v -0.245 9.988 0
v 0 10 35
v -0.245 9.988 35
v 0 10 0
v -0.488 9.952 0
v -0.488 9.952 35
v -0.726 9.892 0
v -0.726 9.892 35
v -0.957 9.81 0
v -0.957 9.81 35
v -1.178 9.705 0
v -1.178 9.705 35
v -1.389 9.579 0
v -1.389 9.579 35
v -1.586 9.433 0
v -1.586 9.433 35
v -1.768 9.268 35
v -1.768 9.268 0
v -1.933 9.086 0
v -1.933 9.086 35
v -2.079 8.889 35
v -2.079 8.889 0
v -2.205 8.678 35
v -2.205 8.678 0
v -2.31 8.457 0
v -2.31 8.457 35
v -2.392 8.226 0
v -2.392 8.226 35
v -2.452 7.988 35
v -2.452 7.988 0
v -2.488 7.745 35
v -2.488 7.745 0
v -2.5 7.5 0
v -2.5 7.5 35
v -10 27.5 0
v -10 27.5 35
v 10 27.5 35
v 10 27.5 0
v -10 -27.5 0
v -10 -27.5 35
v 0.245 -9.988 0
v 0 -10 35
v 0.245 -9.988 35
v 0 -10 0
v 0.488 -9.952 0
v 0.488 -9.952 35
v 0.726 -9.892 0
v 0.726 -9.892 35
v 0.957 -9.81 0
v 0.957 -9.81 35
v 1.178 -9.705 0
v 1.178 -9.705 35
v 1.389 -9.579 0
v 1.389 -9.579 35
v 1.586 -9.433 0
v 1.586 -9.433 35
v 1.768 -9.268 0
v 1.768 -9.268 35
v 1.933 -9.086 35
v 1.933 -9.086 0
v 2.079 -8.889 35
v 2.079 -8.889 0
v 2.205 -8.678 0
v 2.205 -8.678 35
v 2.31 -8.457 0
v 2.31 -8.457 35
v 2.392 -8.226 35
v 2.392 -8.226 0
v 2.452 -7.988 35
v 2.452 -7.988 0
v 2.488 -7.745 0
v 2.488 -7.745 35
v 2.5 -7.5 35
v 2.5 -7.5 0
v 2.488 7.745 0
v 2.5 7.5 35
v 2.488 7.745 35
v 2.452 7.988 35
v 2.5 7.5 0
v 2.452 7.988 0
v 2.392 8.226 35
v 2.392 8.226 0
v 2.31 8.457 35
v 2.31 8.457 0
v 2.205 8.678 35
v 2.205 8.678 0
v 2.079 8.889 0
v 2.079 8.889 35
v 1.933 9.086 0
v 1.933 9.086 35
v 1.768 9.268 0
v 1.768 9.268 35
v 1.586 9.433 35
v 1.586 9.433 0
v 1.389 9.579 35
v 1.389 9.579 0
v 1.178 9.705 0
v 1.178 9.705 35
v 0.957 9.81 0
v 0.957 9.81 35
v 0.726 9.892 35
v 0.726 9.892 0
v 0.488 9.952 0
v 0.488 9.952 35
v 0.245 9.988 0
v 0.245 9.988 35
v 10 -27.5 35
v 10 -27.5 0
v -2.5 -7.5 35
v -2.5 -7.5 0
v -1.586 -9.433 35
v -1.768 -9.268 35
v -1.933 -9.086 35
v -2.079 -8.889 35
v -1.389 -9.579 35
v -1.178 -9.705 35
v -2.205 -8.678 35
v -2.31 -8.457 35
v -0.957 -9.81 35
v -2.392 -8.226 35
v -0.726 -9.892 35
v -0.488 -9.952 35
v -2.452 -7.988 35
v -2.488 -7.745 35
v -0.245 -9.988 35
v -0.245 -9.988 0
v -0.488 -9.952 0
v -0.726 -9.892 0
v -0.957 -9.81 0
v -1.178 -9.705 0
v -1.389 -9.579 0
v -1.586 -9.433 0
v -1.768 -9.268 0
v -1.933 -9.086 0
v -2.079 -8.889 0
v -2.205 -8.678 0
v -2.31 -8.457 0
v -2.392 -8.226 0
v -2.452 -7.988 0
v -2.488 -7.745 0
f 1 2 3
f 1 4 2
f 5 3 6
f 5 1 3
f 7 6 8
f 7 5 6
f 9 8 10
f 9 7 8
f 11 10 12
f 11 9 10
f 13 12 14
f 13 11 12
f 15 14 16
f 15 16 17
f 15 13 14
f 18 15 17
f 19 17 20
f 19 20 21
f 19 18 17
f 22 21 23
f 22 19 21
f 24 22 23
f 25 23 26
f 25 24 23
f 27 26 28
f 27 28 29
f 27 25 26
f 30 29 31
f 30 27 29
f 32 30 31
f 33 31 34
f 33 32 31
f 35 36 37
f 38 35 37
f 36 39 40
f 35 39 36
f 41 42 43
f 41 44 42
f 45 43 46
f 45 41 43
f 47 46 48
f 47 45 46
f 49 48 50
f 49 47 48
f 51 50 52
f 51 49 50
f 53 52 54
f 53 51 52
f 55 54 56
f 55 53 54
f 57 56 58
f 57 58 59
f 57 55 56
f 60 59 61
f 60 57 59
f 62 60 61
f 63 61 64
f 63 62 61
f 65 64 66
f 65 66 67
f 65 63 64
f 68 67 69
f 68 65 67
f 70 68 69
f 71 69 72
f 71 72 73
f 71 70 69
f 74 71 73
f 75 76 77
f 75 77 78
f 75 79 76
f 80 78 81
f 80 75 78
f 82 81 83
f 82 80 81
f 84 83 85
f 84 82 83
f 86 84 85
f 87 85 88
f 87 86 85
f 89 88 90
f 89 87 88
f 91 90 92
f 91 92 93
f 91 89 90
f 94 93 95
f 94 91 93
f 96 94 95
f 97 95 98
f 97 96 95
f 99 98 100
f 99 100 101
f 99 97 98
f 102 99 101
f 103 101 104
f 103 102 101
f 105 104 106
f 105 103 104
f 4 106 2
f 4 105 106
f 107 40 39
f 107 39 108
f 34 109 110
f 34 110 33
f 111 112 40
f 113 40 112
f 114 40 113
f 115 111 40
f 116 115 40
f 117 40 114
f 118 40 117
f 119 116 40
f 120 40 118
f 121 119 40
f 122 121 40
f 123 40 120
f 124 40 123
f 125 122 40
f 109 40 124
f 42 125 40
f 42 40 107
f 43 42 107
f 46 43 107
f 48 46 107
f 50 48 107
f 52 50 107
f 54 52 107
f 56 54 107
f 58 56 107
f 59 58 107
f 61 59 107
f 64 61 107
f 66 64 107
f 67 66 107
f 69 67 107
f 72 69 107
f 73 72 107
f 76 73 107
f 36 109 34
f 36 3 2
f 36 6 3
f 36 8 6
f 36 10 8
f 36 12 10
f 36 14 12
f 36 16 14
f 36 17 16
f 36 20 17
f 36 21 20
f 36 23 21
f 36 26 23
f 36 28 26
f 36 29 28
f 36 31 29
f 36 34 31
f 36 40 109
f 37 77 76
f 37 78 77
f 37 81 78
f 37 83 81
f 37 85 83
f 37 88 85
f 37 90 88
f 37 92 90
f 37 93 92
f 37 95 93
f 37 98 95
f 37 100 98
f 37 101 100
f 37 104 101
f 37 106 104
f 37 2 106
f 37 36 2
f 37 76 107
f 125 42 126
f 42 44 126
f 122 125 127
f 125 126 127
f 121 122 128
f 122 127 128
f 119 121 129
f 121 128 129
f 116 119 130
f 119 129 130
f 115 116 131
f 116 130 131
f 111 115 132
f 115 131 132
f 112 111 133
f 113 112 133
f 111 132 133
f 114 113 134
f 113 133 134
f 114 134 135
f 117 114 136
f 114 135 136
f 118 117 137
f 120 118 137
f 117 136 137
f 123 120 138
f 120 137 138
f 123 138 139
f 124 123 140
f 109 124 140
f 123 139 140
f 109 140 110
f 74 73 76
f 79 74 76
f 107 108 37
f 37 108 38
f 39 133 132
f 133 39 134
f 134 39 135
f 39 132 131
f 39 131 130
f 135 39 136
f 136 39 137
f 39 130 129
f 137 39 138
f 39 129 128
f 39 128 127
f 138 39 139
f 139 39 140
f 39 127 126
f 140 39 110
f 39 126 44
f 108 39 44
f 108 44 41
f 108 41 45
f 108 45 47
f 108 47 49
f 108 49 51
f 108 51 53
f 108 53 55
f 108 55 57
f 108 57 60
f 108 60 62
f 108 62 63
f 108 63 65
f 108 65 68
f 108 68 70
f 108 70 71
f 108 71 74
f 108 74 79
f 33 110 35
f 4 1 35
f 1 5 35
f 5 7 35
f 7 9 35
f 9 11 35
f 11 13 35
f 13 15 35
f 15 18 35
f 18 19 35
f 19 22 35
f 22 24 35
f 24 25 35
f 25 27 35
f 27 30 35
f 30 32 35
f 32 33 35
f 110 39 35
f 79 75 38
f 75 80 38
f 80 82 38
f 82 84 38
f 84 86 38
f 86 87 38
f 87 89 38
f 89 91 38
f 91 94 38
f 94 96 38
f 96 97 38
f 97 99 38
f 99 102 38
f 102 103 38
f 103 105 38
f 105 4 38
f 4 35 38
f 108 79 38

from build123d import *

# Parameters (mm, degrees)
F0_W     = 20
F0_H     = 55
F1_DEPTH = 35
F2_W     = 5
F2_H     = 20
F3_DEPTH = 35.001
F4_R     = 2.49999


# Not quite as in the source:
# - a fillet or chamfer is up to 0.001 mm smaller than in the source, because OpenCascade refuses the exact size


with BuildPart() as f1:
    # F0 (on Top) → F1 (new body)
    with BuildSketch(Plane.XY):
        Rectangle(F0_W, F0_H)
    extrude(amount=F1_DEPTH)

    # F2 (on face) → F3 (cut, through all)
    with BuildSketch(Plane.XY.offset(35)):
        Rectangle(F2_W, F2_H)
    extrude(amount=-F3_DEPTH, mode=Mode.SUBTRACT)

    # F4 (radius 2.5 in the source; OpenCascade refuses exactly that, so slightly less here)
    f4_edges = [f1.edges().sort_by_distance(p)[0] for p in [
        (-2.5, 10, 17.5),
        (2.5, 10, 17.5),
        (2.5, -10, 17.5),
        (-2.5, -10, 17.5),
    ]]
    fillet(f4_edges, radius=F4_R)


solid = f1.part
